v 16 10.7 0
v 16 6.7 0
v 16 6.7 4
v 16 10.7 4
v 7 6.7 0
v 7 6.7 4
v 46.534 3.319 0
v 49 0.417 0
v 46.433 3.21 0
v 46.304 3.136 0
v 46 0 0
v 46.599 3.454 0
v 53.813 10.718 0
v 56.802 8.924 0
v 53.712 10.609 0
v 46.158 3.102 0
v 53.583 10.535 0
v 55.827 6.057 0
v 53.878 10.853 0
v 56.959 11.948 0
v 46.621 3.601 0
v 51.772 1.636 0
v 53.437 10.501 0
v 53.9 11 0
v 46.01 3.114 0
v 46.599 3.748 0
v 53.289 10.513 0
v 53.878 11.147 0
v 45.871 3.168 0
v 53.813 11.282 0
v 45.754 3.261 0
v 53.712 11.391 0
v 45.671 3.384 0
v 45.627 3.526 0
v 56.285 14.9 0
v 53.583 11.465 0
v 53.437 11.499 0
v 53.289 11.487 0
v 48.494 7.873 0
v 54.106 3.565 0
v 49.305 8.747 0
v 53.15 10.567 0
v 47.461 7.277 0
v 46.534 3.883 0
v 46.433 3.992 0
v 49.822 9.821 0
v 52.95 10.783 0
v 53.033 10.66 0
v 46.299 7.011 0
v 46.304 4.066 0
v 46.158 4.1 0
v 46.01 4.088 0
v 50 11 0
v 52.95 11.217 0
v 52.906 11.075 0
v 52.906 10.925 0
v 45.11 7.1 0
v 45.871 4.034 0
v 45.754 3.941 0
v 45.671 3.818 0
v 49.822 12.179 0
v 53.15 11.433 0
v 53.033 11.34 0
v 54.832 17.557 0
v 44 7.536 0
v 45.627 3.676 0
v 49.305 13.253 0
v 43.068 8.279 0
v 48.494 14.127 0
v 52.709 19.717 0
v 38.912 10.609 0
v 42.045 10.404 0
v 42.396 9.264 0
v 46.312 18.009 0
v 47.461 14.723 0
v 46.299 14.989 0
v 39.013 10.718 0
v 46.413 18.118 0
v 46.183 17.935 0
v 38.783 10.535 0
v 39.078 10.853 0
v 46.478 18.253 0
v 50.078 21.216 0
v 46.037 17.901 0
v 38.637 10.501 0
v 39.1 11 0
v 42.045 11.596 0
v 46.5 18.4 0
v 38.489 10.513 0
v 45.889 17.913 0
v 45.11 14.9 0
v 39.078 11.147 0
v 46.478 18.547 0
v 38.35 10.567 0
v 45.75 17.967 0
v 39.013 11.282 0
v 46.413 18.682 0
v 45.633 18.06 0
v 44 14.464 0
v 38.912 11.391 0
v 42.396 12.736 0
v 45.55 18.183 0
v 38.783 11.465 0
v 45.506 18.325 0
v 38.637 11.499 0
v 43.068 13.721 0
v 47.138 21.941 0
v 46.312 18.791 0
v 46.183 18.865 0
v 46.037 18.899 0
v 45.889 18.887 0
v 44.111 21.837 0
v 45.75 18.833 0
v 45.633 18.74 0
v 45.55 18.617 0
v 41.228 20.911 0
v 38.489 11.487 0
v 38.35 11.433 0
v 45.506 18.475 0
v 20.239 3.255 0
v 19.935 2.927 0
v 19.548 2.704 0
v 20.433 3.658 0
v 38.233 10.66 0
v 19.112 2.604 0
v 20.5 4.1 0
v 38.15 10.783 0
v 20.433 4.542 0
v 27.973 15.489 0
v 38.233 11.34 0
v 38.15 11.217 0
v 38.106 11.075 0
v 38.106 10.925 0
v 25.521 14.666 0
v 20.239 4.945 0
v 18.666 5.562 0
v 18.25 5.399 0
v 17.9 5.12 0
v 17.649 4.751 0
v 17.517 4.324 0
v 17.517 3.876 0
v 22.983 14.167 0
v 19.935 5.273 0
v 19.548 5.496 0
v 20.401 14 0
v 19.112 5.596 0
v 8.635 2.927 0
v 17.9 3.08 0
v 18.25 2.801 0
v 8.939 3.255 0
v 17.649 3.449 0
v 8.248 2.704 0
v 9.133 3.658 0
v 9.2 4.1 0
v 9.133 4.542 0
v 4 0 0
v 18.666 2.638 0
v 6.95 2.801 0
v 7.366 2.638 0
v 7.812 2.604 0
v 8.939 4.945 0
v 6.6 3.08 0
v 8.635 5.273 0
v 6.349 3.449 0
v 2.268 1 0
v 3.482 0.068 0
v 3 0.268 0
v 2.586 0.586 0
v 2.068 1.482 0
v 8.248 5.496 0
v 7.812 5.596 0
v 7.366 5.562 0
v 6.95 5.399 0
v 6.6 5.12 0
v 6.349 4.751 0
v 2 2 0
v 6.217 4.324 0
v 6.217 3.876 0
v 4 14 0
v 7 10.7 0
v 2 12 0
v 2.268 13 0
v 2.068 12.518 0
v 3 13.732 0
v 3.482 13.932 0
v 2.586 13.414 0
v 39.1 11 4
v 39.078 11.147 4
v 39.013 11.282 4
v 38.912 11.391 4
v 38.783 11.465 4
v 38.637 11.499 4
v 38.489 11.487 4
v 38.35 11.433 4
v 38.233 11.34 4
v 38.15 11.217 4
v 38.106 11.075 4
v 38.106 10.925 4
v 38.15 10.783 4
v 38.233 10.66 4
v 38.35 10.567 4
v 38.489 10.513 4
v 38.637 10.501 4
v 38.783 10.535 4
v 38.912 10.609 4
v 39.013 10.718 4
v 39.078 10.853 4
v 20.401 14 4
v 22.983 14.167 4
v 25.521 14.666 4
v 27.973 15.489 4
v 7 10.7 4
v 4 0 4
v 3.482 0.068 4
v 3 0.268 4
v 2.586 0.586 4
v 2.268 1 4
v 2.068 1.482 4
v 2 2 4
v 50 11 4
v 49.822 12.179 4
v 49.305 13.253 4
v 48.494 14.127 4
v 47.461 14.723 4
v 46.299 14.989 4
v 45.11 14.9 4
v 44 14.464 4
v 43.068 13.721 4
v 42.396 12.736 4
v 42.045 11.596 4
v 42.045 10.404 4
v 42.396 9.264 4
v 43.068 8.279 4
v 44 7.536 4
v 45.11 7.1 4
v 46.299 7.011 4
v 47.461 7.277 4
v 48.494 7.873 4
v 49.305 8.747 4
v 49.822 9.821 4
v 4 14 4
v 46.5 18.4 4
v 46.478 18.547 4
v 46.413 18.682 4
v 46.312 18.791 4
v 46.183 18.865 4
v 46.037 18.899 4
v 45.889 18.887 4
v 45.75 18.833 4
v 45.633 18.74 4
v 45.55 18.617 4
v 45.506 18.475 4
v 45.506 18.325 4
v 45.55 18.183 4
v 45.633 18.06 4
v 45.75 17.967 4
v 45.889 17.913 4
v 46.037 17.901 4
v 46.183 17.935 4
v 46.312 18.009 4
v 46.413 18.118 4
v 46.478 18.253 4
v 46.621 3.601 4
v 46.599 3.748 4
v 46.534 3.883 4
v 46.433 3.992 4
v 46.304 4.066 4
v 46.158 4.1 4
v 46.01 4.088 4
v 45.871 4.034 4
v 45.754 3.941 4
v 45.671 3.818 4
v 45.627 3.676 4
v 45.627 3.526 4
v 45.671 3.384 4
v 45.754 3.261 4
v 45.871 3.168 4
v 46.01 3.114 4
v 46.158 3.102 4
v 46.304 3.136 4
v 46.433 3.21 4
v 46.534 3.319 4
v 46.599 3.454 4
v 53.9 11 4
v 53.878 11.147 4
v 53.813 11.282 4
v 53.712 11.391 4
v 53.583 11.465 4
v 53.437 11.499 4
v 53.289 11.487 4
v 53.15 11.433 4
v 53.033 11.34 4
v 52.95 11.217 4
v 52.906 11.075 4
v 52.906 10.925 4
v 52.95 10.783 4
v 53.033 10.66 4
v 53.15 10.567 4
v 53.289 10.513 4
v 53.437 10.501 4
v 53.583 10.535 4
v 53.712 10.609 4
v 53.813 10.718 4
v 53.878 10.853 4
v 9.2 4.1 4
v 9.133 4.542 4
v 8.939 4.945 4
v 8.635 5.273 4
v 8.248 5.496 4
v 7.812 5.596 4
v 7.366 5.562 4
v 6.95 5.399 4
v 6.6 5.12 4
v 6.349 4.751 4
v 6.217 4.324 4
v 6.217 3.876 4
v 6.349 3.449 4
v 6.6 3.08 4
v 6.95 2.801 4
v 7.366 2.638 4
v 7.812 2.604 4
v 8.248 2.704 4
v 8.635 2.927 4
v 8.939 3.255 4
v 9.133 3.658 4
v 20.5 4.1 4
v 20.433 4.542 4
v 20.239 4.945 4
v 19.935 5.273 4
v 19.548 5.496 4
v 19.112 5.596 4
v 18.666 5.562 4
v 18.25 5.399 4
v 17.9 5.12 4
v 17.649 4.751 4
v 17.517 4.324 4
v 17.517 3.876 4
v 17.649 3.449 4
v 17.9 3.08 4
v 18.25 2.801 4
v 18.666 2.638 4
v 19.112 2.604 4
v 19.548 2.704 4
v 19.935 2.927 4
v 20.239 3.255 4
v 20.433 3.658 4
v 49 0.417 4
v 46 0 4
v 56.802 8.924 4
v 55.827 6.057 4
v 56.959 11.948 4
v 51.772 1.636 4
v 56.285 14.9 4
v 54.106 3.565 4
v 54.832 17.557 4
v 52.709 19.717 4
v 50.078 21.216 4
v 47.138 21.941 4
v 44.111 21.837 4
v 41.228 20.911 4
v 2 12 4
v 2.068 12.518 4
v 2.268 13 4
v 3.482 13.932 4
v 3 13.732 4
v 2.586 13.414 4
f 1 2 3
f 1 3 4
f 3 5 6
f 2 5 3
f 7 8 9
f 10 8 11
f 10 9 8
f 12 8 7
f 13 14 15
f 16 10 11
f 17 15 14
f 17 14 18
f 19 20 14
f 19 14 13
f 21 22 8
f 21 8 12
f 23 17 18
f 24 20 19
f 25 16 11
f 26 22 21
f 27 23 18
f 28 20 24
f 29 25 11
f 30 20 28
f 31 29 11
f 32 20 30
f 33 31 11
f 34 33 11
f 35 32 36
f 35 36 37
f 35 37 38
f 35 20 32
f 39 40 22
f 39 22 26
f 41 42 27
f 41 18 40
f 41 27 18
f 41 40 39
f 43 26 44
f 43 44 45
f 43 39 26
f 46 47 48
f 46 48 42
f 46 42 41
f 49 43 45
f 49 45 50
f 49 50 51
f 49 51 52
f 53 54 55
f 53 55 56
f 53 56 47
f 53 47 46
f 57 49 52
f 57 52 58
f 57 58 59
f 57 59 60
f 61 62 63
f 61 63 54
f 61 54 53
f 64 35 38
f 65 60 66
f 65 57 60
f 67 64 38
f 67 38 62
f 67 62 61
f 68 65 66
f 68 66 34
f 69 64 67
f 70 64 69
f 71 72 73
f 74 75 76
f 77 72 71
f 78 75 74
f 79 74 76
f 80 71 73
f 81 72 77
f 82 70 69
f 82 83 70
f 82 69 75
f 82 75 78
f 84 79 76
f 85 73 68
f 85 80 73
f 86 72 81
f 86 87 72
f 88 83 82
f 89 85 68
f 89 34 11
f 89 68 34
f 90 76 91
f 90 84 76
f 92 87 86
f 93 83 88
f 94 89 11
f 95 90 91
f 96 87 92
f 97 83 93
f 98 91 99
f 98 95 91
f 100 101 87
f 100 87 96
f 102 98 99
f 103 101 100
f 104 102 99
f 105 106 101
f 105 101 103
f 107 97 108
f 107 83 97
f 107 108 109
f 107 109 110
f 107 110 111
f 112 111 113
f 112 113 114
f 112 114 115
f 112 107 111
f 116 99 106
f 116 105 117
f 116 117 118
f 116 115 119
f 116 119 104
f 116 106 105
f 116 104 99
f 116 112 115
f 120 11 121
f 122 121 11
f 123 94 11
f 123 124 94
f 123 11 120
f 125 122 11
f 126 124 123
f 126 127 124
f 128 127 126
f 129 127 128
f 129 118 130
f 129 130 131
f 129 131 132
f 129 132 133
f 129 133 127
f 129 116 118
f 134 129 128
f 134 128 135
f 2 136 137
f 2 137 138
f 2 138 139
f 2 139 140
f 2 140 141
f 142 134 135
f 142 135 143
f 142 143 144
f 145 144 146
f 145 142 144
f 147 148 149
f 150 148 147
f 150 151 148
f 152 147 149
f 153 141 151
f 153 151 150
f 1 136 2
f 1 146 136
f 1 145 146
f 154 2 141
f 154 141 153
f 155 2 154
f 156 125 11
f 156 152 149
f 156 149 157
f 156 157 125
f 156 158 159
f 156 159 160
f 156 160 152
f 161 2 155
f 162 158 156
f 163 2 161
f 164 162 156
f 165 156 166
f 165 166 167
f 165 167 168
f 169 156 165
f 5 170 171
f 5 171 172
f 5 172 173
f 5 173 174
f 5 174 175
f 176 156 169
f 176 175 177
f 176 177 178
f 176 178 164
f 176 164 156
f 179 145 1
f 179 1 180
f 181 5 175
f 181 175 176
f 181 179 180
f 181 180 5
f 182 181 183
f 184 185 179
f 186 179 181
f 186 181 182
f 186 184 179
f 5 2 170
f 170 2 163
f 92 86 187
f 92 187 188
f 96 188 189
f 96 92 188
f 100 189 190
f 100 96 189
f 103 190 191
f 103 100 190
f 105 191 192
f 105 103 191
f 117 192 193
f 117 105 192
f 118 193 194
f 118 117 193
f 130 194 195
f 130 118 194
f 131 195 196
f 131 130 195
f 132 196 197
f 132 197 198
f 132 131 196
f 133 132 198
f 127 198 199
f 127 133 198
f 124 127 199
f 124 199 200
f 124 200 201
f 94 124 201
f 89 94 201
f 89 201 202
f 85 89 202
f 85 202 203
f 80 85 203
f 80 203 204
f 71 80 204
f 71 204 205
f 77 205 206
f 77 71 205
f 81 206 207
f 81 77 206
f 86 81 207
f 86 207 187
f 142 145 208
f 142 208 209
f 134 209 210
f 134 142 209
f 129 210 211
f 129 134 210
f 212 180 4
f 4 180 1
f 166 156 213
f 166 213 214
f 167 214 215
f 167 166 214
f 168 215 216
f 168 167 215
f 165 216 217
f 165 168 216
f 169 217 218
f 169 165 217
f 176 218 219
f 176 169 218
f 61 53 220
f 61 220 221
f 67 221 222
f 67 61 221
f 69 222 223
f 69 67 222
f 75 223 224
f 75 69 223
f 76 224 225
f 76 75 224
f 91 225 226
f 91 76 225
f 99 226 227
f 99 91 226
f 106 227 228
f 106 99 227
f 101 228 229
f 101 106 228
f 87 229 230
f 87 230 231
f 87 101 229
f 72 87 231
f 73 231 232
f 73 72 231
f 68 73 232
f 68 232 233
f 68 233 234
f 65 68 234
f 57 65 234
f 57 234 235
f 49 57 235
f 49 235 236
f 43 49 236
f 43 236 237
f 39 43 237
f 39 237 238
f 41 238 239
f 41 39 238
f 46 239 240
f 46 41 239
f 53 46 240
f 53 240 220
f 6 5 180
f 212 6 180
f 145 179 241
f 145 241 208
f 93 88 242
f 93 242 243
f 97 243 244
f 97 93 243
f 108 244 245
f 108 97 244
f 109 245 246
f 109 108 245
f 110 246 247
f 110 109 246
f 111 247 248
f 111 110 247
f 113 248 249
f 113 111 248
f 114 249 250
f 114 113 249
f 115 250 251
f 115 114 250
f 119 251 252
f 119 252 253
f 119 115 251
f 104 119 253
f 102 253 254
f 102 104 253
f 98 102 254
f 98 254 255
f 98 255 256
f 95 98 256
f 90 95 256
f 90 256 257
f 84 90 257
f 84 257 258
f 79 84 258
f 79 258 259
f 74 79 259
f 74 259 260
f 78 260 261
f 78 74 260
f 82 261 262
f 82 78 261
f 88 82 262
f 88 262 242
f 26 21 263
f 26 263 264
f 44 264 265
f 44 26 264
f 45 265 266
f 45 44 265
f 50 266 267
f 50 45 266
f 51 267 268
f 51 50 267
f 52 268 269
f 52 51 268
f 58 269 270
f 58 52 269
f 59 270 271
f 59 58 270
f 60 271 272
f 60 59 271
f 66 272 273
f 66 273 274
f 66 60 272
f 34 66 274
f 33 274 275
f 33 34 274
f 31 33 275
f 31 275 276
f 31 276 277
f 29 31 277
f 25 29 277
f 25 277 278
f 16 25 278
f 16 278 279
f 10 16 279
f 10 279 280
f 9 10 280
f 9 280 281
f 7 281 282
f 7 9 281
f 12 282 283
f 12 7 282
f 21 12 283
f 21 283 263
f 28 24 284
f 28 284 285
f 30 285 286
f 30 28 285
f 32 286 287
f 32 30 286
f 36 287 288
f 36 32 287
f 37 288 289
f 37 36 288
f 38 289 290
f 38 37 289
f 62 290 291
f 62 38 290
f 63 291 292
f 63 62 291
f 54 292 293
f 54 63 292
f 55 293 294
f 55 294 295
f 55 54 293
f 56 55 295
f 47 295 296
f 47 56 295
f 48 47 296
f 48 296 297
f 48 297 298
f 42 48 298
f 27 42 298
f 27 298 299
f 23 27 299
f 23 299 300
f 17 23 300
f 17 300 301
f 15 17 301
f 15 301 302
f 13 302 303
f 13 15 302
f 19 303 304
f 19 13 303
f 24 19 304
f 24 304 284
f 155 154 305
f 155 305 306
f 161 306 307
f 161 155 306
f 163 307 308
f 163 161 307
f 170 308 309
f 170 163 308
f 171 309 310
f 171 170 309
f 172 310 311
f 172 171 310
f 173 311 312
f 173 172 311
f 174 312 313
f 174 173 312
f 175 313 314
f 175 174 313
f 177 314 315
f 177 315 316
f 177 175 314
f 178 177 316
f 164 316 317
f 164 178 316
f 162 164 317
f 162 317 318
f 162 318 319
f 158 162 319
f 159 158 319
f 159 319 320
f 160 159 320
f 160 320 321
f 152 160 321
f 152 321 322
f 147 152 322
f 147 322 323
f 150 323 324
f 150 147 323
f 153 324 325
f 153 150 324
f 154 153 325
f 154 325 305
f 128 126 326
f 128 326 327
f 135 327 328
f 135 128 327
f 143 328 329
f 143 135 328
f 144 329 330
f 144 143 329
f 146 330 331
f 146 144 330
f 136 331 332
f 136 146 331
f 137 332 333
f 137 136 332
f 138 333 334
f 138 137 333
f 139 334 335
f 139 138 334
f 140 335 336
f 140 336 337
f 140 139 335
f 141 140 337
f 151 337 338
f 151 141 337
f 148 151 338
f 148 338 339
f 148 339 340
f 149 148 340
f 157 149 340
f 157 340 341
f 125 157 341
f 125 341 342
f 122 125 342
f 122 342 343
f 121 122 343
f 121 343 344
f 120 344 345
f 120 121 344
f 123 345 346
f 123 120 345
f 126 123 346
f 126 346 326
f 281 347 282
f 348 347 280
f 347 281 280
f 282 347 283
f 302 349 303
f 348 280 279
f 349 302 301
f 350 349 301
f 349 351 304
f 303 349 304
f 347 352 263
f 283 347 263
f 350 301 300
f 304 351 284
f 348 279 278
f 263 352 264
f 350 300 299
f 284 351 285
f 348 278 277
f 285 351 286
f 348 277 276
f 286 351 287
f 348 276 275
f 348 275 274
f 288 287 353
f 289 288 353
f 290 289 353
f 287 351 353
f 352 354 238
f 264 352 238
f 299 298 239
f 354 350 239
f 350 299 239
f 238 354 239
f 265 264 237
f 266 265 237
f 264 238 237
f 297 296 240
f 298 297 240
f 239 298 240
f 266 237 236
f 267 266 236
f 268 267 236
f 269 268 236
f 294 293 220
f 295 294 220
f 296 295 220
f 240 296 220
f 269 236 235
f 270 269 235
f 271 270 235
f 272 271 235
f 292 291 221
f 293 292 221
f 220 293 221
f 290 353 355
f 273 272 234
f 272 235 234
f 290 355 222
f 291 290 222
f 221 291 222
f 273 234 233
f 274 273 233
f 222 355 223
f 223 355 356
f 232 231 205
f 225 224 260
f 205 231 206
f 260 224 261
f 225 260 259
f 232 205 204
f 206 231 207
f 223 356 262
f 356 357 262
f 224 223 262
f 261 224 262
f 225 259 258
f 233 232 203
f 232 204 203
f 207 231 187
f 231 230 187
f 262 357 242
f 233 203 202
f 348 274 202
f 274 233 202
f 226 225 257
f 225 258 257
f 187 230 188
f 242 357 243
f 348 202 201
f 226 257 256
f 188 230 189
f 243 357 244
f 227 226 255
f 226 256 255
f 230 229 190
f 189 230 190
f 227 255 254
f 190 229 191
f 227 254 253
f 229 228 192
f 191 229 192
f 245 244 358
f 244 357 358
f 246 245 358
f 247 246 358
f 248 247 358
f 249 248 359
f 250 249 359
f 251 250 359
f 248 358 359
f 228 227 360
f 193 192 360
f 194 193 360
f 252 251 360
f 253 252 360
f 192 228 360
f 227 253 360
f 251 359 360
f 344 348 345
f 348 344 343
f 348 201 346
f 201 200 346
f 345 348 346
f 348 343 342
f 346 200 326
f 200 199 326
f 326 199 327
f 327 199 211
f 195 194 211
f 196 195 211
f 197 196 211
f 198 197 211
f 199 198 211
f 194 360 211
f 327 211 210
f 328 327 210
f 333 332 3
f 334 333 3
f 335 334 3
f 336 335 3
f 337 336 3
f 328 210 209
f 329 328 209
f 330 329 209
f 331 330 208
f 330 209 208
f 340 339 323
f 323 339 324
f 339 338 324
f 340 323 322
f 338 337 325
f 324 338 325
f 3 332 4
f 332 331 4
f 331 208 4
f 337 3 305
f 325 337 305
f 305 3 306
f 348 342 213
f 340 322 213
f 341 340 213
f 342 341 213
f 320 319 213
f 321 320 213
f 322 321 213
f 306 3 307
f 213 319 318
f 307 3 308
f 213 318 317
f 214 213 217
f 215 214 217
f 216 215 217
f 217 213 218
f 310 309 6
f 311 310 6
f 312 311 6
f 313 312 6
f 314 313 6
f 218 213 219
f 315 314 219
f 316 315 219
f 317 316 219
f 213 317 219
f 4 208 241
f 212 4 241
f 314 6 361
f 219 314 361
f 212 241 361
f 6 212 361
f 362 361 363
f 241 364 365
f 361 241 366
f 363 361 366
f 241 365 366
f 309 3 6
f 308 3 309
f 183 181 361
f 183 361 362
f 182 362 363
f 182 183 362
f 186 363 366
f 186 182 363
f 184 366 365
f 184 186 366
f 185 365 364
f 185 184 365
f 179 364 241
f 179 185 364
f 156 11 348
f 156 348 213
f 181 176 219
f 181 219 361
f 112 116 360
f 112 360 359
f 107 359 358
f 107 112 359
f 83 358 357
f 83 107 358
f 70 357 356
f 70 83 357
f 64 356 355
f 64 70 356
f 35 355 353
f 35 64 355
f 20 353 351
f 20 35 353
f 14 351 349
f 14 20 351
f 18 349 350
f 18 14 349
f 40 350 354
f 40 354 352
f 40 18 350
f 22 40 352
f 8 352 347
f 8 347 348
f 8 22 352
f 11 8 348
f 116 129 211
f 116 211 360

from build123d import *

# Parameters (mm, degrees)
SKETCH1_R           = 4
SKETCH1_R_2         = 0.5
SKETCH1_R_3         = 1.5
SKETCH1_W           = 9
SKETCH1_H           = 4
BOSS_EXTRUDE1_DEPTH = 4


with BuildPart() as part:
    # Sketch1 → Boss-Extrude1 (new body)
    with BuildSketch(Plane.XY):
        with BuildLine():
            Line((2, 2), (2, 12))
            ThreePointArc((2, 12), (2.585786438, 13.414213562), (4, 14))
            Line((4, 14), (20.401115249, 14))
            ThreePointArc((20.401115249, 14), (24.259789892, 14.375764219), (27.973469349, 15.488937))
            Line((27.973469349, 15.488937), (41.227821741, 20.910918962))
            ThreePointArc((41.227821741, 20.910918962), (56.724274068, 13.447436559), (46, 0))
            Line((46, 0), (4, 0))
            ThreePointArc((4, 0), (2.585786438, 0.585786438), (2, 2))
        make_face()
        with Locations((46, 11)):
            Circle(SKETCH1_R, mode=Mode.SUBTRACT)
        with Locations((46, 18.4)):
            Circle(SKETCH1_R_2, mode=Mode.SUBTRACT)
        with Locations((46.121025162, 3.600989734)):
            Circle(SKETCH1_R_2, mode=Mode.SUBTRACT)
        with Locations((53.4, 11)):
            Circle(SKETCH1_R_2, mode=Mode.SUBTRACT)
        with Locations((38.6, 11)):
            Circle(SKETCH1_R_2, mode=Mode.SUBTRACT)
        with Locations((19, 4.1)):
            Circle(SKETCH1_R_3, mode=Mode.SUBTRACT)
        with Locations((7.7, 4.1)):
            Circle(SKETCH1_R_3, mode=Mode.SUBTRACT)
        with Locations((11.5, 8.7)):
            Rectangle(SKETCH1_W, SKETCH1_H, mode=Mode.SUBTRACT)
    extrude(amount=BOSS_EXTRUDE1_DEPTH)


solid = part.part
